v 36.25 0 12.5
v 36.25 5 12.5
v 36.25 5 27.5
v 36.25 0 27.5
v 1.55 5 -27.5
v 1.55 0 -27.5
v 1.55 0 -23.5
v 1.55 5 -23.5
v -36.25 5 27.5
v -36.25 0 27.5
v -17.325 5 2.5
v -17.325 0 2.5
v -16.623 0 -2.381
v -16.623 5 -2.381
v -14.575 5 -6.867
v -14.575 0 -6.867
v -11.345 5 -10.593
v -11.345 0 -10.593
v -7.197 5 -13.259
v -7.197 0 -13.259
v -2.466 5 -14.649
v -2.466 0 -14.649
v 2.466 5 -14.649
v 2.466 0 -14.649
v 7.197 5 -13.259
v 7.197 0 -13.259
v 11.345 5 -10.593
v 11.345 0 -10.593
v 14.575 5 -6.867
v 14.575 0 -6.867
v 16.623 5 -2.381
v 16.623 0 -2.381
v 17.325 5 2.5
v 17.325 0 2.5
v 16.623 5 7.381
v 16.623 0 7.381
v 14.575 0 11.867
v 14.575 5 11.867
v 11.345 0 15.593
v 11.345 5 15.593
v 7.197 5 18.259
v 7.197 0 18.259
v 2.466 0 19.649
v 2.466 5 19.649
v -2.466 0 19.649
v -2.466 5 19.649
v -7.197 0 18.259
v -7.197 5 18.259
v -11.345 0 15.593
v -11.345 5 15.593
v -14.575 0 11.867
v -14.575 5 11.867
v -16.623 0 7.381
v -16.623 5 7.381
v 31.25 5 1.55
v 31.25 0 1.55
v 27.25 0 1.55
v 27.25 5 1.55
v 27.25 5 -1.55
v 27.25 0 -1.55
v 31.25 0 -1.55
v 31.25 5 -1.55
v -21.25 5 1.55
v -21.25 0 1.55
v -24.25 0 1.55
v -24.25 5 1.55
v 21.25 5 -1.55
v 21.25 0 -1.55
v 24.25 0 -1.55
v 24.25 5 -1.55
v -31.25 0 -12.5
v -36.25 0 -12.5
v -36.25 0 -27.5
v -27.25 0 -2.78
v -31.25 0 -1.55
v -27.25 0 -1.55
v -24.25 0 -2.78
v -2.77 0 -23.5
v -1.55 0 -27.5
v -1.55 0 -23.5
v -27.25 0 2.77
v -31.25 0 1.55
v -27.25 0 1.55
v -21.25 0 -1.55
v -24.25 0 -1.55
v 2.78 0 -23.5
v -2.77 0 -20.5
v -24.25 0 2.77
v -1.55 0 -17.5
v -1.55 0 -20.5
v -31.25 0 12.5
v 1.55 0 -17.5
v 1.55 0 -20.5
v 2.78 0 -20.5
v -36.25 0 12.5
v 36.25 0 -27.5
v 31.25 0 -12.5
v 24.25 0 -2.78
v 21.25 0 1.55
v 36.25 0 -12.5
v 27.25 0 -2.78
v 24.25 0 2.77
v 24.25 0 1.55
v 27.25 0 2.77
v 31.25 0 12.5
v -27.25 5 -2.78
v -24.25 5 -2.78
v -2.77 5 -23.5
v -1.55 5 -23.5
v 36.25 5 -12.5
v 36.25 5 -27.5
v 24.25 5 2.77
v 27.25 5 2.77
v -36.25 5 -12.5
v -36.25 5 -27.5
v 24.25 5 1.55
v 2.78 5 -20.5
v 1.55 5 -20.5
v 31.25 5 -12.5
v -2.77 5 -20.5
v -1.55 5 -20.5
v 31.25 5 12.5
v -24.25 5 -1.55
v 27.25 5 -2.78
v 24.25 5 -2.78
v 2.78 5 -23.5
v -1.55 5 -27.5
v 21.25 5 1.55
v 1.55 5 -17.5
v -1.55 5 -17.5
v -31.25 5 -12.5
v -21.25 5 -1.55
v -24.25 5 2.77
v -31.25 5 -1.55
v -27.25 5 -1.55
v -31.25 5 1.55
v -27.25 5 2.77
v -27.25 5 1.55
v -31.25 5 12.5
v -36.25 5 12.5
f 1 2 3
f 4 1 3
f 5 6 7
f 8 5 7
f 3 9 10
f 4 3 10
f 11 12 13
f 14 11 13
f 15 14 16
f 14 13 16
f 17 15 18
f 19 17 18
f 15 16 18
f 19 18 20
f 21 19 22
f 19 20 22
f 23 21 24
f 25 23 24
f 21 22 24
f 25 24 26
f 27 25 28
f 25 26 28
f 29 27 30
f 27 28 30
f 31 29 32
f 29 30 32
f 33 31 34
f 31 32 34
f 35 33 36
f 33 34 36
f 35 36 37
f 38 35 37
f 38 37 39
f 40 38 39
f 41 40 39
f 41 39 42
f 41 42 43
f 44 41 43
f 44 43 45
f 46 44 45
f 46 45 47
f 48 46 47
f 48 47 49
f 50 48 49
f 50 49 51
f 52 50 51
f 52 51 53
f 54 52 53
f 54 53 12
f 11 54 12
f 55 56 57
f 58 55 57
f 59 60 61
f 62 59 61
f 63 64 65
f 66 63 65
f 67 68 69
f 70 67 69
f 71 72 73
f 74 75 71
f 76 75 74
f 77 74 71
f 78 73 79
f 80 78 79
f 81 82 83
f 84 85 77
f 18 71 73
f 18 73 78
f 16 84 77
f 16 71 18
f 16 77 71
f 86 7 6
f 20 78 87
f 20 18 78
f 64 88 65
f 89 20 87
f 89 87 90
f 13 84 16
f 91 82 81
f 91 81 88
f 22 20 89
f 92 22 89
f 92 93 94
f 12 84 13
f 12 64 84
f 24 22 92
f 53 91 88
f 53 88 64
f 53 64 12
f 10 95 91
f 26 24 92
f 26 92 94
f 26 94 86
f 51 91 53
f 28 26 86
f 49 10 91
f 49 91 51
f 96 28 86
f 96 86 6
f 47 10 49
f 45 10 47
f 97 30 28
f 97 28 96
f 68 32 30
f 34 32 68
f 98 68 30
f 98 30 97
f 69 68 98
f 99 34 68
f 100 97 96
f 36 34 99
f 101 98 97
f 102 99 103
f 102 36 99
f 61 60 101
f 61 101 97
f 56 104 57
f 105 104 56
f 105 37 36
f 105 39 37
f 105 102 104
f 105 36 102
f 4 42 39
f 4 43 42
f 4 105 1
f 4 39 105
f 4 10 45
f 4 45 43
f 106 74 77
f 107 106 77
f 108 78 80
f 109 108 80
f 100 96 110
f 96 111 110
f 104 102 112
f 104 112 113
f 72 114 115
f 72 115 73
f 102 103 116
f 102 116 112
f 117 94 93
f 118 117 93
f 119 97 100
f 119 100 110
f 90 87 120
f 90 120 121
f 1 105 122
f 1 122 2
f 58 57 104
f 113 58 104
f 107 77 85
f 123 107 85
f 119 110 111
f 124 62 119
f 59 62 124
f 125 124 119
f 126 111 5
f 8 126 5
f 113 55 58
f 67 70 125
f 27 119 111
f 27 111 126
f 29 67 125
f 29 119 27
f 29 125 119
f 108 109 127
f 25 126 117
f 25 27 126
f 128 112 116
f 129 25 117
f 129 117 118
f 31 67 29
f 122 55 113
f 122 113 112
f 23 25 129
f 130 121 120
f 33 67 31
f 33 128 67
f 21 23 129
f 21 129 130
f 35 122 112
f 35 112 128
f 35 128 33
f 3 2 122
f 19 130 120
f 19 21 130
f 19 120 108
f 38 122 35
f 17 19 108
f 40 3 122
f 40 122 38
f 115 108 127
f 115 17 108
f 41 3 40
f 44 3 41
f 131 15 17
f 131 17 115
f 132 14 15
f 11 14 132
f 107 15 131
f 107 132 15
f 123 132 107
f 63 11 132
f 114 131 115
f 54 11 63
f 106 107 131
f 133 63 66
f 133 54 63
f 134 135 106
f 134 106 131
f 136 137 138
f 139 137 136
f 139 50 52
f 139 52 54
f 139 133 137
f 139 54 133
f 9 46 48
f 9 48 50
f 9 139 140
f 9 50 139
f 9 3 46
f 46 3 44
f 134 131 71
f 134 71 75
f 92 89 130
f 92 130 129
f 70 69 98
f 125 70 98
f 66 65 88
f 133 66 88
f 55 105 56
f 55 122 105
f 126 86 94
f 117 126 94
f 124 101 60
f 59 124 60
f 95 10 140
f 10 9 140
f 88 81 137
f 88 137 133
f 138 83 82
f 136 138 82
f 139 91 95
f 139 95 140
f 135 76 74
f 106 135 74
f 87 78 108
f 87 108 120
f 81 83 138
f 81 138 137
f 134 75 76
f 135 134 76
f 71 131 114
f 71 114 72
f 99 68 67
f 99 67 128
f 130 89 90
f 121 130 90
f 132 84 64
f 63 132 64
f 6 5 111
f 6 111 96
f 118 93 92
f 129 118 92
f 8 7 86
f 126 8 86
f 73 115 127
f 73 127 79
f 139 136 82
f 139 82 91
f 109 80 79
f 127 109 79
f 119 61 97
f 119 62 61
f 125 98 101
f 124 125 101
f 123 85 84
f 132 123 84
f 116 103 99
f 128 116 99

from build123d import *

# Parameters (mm, degrees)
ESQUISSE1_W             = 26.25
ESQUISSE1_H             = 55
BOSS_EXTRU_1_DEPTH      = 5
BOSS_EXTRU_2_DEPTH      = 5
BOSS_EXTRU_3_DEPTH      = 5
ENL_V_MAT_EXTRU_1_DEPTH = 5
ESQUISSE5_W             = 50
ESQUISSE5_H             = 5
BOSS_EXTRU_4_DEPTH      = 36.25
BOSS_EXTRU_5_DEPTH      = 5
BOSS_EXTRU_6_DEPTH      = 5
BOSS_EXTRU_7_DEPTH      = 5
D_GAGEMENT_M301_D       = 34.65
D_GAGEMENT_M301_DEPTH   = 5
CONG_1_R                = 1.6
ESQUISSE11_W            = 20.033305553
ESQUISSE11_H            = 6.190231364
ESQUISSE11_W_2          = 5
ESQUISSE11_H_2          = 2.95
BOSS_EXTRU_8_DEPTH      = 5
ESQUISSE12_W            = 3.1
ESQUISSE12_H            = 4
ESQUISSE12_H_2          = 3
ESQUISSE12_W_2          = 1.23
ESQUISSE12_W_3          = 1.22
ESQUISSE12_W_4          = 4
ESQUISSE12_H_3          = 3.1
ESQUISSE12_W_5          = 3
ESQUISSE12_H_4          = 1.23
ESQUISSE12_H_5          = 1.22
ENL_V_MAT_EXTRU_2_DEPTH = 6


with BuildPart() as part:
    # Esquisse1 → Boss.-Extru.1 (new body)
    with BuildSketch(Plane(origin=(0, 5, 0), x_dir=(1, 0, 0), z_dir=(0, 1, 0))):
        with Locations((18.125, 0)):
            Rectangle(ESQUISSE1_W, ESQUISSE1_H)
    extrude(amount=-BOSS_EXTRU_1_DEPTH)

    # Esquisse2 → Boss.-Extru.2 (add)
    with BuildSketch(Plane(origin=(31.25, 0, 0), x_dir=(0, 0, -1), z_dir=(1, 0, 0))):
        Polygon((27.5, 5), (27.5, 0), (15.45, 0), (12.5, 2.95), (12.5, 5), align=None)
    extrude(amount=BOSS_EXTRU_2_DEPTH)

    # Esquisse3 → Boss.-Extru.3 (add)
    with BuildSketch(Plane(origin=(31.25, 0, 0), x_dir=(0, 0, -1), z_dir=(1, 0, 0))):
        Polygon((-15.45, 0), (-27.5, 0), (-27.5, 5), (-12.5, 5), (-12.5, 2.95), align=None)
    extrude(amount=BOSS_EXTRU_3_DEPTH)

    # Esquisse4 → Enlèv. mat.-Extru.1 (cut)
    with BuildSketch(Plane(origin=(0, 0, -27.5), x_dir=(-1, 0, 0), z_dir=(0, 0, -1))):
        Polygon((-5, 0), (-5, 2.95), (-7.95, 0), align=None)
    extrude(amount=-ENL_V_MAT_EXTRU_1_DEPTH, mode=Mode.SUBTRACT)

    # Esquisse5 → Boss.-Extru.4 (add)
    with BuildSketch(Plane.ZY.offset(-5)):
        with Locations((2.5, 2.5)):
            Rectangle(ESQUISSE5_W, ESQUISSE5_H)
    extrude(amount=BOSS_EXTRU_4_DEPTH)

    # Esquisse6 → Boss.-Extru.5 (add)
    with BuildSketch(Plane.ZY.offset(31.25)):
        Polygon((27.5, 5), (27.5, 0), (15.45, 0), (12.5, 2.95), (12.5, 5), align=None)
    extrude(amount=BOSS_EXTRU_5_DEPTH)

    # Esquisse7 → Boss.-Extru.6 (add)
    with BuildSketch(Plane.ZY.offset(31.25)):
        Polygon((-22.5, 5), (-12.5, 5), (-12.5, 2.95), (-15.45, 0), (-22.5, 0), align=None)
    extrude(amount=BOSS_EXTRU_6_DEPTH)

    # Esquisse8 → Boss.-Extru.7 (add)
    with BuildSketch(Plane(origin=(0, 0, -22.5), x_dir=(-1, 0, 0), z_dir=(0, 0, -1))):
        Polygon((5, 2.95), (5, 5), (36.25, 5), (36.25, 0), (7.95, 0), align=None)
    extrude(amount=BOSS_EXTRU_7_DEPTH)

    # Dégagement M301
    with Locations(Plane(origin=(0, 5, 0), x_dir=(1, 0, 0), z_dir=(0, 1, 0))):
        with Locations((0, -2.5)):
            Hole(D_GAGEMENT_M301_D / 2, depth=D_GAGEMENT_M301_DEPTH)

    # Congé1
    cong_1_edges = [part.edges().sort_by_distance(p)[0] for p in [
        (-5, 2.95, -25),
        (33.75, 2.95, -12.5),
        (33.75, 2.95, 12.5),
        (5, 2.95, -25),
        (-33.75, 2.95, 12.5),
        (-33.75, 2.95, -12.5),
    ]]
    fillet(cong_1_edges, radius=CONG_1_R)

    # Esquisse11 → Boss.-Extru.8 (add)
    with BuildSketch(Plane.XZ):
        with Locations((0.06715792, -24.404884318)):
            Rectangle(ESQUISSE11_W, ESQUISSE11_H)
        with Locations((-33.75, -13.975)):
            Rectangle(ESQUISSE11_W_2, ESQUISSE11_H_2)
        with Locations((-33.75, 13.975)):
            Rectangle(ESQUISSE11_W_2, ESQUISSE11_H_2)
        with Locations((33.75, 13.975)):
            Rectangle(ESQUISSE11_W_2, ESQUISSE11_H_2)
        with Locations((33.75, -13.975)):
            Rectangle(ESQUISSE11_W_2, ESQUISSE11_H_2)
    extrude(amount=-BOSS_EXTRU_8_DEPTH)

    # Esquisse12 → Enlèv. mat.-Extru.2 (cut, through all)
    with BuildSketch(Plane.XZ):
        with Locations((0, -25.5)):
            Rectangle(ESQUISSE12_W, ESQUISSE12_H)
        with Locations((0, -22)):
            Rectangle(ESQUISSE12_W, ESQUISSE12_H_2)
        with Locations((2.165, -22)):
            Rectangle(ESQUISSE12_W_2, ESQUISSE12_H_2)
        with Locations((0, -19)):
            Rectangle(ESQUISSE12_W, ESQUISSE12_H_2)
        with Locations((-2.16, -22)):
            Rectangle(ESQUISSE12_W_3, ESQUISSE12_H_2)
        with Locations((29.25, 0)):
            Rectangle(ESQUISSE12_W_4, ESQUISSE12_H_3)
        with Locations((25.75, 0)):
            Rectangle(ESQUISSE12_W_5, ESQUISSE12_H_3)
        with Locations((25.75, -2.165)):
            Rectangle(ESQUISSE12_W_5, ESQUISSE12_H_4)
        with Locations((22.75, 0)):
            Rectangle(ESQUISSE12_W_5, ESQUISSE12_H_3)
        with Locations((25.75, 2.16)):
            Rectangle(ESQUISSE12_W_5, ESQUISSE12_H_5)
        with Locations((-22.75, 0)):
            Rectangle(ESQUISSE12_W_5, ESQUISSE12_H_3)
        with Locations((-25.75, 0)):
            Rectangle(ESQUISSE12_W_5, ESQUISSE12_H_3)
        with Locations((-25.75, -2.165)):
            Rectangle(ESQUISSE12_W_5, ESQUISSE12_H_4)
        with Locations((-29.25, 0)):
            Rectangle(ESQUISSE12_W_4, ESQUISSE12_H_3)
        with Locations((-25.75, 2.16)):
            Rectangle(ESQUISSE12_W_5, ESQUISSE12_H_5)
    extrude(amount=-ENL_V_MAT_EXTRU_2_DEPTH, mode=Mode.SUBTRACT)


solid = part.part
